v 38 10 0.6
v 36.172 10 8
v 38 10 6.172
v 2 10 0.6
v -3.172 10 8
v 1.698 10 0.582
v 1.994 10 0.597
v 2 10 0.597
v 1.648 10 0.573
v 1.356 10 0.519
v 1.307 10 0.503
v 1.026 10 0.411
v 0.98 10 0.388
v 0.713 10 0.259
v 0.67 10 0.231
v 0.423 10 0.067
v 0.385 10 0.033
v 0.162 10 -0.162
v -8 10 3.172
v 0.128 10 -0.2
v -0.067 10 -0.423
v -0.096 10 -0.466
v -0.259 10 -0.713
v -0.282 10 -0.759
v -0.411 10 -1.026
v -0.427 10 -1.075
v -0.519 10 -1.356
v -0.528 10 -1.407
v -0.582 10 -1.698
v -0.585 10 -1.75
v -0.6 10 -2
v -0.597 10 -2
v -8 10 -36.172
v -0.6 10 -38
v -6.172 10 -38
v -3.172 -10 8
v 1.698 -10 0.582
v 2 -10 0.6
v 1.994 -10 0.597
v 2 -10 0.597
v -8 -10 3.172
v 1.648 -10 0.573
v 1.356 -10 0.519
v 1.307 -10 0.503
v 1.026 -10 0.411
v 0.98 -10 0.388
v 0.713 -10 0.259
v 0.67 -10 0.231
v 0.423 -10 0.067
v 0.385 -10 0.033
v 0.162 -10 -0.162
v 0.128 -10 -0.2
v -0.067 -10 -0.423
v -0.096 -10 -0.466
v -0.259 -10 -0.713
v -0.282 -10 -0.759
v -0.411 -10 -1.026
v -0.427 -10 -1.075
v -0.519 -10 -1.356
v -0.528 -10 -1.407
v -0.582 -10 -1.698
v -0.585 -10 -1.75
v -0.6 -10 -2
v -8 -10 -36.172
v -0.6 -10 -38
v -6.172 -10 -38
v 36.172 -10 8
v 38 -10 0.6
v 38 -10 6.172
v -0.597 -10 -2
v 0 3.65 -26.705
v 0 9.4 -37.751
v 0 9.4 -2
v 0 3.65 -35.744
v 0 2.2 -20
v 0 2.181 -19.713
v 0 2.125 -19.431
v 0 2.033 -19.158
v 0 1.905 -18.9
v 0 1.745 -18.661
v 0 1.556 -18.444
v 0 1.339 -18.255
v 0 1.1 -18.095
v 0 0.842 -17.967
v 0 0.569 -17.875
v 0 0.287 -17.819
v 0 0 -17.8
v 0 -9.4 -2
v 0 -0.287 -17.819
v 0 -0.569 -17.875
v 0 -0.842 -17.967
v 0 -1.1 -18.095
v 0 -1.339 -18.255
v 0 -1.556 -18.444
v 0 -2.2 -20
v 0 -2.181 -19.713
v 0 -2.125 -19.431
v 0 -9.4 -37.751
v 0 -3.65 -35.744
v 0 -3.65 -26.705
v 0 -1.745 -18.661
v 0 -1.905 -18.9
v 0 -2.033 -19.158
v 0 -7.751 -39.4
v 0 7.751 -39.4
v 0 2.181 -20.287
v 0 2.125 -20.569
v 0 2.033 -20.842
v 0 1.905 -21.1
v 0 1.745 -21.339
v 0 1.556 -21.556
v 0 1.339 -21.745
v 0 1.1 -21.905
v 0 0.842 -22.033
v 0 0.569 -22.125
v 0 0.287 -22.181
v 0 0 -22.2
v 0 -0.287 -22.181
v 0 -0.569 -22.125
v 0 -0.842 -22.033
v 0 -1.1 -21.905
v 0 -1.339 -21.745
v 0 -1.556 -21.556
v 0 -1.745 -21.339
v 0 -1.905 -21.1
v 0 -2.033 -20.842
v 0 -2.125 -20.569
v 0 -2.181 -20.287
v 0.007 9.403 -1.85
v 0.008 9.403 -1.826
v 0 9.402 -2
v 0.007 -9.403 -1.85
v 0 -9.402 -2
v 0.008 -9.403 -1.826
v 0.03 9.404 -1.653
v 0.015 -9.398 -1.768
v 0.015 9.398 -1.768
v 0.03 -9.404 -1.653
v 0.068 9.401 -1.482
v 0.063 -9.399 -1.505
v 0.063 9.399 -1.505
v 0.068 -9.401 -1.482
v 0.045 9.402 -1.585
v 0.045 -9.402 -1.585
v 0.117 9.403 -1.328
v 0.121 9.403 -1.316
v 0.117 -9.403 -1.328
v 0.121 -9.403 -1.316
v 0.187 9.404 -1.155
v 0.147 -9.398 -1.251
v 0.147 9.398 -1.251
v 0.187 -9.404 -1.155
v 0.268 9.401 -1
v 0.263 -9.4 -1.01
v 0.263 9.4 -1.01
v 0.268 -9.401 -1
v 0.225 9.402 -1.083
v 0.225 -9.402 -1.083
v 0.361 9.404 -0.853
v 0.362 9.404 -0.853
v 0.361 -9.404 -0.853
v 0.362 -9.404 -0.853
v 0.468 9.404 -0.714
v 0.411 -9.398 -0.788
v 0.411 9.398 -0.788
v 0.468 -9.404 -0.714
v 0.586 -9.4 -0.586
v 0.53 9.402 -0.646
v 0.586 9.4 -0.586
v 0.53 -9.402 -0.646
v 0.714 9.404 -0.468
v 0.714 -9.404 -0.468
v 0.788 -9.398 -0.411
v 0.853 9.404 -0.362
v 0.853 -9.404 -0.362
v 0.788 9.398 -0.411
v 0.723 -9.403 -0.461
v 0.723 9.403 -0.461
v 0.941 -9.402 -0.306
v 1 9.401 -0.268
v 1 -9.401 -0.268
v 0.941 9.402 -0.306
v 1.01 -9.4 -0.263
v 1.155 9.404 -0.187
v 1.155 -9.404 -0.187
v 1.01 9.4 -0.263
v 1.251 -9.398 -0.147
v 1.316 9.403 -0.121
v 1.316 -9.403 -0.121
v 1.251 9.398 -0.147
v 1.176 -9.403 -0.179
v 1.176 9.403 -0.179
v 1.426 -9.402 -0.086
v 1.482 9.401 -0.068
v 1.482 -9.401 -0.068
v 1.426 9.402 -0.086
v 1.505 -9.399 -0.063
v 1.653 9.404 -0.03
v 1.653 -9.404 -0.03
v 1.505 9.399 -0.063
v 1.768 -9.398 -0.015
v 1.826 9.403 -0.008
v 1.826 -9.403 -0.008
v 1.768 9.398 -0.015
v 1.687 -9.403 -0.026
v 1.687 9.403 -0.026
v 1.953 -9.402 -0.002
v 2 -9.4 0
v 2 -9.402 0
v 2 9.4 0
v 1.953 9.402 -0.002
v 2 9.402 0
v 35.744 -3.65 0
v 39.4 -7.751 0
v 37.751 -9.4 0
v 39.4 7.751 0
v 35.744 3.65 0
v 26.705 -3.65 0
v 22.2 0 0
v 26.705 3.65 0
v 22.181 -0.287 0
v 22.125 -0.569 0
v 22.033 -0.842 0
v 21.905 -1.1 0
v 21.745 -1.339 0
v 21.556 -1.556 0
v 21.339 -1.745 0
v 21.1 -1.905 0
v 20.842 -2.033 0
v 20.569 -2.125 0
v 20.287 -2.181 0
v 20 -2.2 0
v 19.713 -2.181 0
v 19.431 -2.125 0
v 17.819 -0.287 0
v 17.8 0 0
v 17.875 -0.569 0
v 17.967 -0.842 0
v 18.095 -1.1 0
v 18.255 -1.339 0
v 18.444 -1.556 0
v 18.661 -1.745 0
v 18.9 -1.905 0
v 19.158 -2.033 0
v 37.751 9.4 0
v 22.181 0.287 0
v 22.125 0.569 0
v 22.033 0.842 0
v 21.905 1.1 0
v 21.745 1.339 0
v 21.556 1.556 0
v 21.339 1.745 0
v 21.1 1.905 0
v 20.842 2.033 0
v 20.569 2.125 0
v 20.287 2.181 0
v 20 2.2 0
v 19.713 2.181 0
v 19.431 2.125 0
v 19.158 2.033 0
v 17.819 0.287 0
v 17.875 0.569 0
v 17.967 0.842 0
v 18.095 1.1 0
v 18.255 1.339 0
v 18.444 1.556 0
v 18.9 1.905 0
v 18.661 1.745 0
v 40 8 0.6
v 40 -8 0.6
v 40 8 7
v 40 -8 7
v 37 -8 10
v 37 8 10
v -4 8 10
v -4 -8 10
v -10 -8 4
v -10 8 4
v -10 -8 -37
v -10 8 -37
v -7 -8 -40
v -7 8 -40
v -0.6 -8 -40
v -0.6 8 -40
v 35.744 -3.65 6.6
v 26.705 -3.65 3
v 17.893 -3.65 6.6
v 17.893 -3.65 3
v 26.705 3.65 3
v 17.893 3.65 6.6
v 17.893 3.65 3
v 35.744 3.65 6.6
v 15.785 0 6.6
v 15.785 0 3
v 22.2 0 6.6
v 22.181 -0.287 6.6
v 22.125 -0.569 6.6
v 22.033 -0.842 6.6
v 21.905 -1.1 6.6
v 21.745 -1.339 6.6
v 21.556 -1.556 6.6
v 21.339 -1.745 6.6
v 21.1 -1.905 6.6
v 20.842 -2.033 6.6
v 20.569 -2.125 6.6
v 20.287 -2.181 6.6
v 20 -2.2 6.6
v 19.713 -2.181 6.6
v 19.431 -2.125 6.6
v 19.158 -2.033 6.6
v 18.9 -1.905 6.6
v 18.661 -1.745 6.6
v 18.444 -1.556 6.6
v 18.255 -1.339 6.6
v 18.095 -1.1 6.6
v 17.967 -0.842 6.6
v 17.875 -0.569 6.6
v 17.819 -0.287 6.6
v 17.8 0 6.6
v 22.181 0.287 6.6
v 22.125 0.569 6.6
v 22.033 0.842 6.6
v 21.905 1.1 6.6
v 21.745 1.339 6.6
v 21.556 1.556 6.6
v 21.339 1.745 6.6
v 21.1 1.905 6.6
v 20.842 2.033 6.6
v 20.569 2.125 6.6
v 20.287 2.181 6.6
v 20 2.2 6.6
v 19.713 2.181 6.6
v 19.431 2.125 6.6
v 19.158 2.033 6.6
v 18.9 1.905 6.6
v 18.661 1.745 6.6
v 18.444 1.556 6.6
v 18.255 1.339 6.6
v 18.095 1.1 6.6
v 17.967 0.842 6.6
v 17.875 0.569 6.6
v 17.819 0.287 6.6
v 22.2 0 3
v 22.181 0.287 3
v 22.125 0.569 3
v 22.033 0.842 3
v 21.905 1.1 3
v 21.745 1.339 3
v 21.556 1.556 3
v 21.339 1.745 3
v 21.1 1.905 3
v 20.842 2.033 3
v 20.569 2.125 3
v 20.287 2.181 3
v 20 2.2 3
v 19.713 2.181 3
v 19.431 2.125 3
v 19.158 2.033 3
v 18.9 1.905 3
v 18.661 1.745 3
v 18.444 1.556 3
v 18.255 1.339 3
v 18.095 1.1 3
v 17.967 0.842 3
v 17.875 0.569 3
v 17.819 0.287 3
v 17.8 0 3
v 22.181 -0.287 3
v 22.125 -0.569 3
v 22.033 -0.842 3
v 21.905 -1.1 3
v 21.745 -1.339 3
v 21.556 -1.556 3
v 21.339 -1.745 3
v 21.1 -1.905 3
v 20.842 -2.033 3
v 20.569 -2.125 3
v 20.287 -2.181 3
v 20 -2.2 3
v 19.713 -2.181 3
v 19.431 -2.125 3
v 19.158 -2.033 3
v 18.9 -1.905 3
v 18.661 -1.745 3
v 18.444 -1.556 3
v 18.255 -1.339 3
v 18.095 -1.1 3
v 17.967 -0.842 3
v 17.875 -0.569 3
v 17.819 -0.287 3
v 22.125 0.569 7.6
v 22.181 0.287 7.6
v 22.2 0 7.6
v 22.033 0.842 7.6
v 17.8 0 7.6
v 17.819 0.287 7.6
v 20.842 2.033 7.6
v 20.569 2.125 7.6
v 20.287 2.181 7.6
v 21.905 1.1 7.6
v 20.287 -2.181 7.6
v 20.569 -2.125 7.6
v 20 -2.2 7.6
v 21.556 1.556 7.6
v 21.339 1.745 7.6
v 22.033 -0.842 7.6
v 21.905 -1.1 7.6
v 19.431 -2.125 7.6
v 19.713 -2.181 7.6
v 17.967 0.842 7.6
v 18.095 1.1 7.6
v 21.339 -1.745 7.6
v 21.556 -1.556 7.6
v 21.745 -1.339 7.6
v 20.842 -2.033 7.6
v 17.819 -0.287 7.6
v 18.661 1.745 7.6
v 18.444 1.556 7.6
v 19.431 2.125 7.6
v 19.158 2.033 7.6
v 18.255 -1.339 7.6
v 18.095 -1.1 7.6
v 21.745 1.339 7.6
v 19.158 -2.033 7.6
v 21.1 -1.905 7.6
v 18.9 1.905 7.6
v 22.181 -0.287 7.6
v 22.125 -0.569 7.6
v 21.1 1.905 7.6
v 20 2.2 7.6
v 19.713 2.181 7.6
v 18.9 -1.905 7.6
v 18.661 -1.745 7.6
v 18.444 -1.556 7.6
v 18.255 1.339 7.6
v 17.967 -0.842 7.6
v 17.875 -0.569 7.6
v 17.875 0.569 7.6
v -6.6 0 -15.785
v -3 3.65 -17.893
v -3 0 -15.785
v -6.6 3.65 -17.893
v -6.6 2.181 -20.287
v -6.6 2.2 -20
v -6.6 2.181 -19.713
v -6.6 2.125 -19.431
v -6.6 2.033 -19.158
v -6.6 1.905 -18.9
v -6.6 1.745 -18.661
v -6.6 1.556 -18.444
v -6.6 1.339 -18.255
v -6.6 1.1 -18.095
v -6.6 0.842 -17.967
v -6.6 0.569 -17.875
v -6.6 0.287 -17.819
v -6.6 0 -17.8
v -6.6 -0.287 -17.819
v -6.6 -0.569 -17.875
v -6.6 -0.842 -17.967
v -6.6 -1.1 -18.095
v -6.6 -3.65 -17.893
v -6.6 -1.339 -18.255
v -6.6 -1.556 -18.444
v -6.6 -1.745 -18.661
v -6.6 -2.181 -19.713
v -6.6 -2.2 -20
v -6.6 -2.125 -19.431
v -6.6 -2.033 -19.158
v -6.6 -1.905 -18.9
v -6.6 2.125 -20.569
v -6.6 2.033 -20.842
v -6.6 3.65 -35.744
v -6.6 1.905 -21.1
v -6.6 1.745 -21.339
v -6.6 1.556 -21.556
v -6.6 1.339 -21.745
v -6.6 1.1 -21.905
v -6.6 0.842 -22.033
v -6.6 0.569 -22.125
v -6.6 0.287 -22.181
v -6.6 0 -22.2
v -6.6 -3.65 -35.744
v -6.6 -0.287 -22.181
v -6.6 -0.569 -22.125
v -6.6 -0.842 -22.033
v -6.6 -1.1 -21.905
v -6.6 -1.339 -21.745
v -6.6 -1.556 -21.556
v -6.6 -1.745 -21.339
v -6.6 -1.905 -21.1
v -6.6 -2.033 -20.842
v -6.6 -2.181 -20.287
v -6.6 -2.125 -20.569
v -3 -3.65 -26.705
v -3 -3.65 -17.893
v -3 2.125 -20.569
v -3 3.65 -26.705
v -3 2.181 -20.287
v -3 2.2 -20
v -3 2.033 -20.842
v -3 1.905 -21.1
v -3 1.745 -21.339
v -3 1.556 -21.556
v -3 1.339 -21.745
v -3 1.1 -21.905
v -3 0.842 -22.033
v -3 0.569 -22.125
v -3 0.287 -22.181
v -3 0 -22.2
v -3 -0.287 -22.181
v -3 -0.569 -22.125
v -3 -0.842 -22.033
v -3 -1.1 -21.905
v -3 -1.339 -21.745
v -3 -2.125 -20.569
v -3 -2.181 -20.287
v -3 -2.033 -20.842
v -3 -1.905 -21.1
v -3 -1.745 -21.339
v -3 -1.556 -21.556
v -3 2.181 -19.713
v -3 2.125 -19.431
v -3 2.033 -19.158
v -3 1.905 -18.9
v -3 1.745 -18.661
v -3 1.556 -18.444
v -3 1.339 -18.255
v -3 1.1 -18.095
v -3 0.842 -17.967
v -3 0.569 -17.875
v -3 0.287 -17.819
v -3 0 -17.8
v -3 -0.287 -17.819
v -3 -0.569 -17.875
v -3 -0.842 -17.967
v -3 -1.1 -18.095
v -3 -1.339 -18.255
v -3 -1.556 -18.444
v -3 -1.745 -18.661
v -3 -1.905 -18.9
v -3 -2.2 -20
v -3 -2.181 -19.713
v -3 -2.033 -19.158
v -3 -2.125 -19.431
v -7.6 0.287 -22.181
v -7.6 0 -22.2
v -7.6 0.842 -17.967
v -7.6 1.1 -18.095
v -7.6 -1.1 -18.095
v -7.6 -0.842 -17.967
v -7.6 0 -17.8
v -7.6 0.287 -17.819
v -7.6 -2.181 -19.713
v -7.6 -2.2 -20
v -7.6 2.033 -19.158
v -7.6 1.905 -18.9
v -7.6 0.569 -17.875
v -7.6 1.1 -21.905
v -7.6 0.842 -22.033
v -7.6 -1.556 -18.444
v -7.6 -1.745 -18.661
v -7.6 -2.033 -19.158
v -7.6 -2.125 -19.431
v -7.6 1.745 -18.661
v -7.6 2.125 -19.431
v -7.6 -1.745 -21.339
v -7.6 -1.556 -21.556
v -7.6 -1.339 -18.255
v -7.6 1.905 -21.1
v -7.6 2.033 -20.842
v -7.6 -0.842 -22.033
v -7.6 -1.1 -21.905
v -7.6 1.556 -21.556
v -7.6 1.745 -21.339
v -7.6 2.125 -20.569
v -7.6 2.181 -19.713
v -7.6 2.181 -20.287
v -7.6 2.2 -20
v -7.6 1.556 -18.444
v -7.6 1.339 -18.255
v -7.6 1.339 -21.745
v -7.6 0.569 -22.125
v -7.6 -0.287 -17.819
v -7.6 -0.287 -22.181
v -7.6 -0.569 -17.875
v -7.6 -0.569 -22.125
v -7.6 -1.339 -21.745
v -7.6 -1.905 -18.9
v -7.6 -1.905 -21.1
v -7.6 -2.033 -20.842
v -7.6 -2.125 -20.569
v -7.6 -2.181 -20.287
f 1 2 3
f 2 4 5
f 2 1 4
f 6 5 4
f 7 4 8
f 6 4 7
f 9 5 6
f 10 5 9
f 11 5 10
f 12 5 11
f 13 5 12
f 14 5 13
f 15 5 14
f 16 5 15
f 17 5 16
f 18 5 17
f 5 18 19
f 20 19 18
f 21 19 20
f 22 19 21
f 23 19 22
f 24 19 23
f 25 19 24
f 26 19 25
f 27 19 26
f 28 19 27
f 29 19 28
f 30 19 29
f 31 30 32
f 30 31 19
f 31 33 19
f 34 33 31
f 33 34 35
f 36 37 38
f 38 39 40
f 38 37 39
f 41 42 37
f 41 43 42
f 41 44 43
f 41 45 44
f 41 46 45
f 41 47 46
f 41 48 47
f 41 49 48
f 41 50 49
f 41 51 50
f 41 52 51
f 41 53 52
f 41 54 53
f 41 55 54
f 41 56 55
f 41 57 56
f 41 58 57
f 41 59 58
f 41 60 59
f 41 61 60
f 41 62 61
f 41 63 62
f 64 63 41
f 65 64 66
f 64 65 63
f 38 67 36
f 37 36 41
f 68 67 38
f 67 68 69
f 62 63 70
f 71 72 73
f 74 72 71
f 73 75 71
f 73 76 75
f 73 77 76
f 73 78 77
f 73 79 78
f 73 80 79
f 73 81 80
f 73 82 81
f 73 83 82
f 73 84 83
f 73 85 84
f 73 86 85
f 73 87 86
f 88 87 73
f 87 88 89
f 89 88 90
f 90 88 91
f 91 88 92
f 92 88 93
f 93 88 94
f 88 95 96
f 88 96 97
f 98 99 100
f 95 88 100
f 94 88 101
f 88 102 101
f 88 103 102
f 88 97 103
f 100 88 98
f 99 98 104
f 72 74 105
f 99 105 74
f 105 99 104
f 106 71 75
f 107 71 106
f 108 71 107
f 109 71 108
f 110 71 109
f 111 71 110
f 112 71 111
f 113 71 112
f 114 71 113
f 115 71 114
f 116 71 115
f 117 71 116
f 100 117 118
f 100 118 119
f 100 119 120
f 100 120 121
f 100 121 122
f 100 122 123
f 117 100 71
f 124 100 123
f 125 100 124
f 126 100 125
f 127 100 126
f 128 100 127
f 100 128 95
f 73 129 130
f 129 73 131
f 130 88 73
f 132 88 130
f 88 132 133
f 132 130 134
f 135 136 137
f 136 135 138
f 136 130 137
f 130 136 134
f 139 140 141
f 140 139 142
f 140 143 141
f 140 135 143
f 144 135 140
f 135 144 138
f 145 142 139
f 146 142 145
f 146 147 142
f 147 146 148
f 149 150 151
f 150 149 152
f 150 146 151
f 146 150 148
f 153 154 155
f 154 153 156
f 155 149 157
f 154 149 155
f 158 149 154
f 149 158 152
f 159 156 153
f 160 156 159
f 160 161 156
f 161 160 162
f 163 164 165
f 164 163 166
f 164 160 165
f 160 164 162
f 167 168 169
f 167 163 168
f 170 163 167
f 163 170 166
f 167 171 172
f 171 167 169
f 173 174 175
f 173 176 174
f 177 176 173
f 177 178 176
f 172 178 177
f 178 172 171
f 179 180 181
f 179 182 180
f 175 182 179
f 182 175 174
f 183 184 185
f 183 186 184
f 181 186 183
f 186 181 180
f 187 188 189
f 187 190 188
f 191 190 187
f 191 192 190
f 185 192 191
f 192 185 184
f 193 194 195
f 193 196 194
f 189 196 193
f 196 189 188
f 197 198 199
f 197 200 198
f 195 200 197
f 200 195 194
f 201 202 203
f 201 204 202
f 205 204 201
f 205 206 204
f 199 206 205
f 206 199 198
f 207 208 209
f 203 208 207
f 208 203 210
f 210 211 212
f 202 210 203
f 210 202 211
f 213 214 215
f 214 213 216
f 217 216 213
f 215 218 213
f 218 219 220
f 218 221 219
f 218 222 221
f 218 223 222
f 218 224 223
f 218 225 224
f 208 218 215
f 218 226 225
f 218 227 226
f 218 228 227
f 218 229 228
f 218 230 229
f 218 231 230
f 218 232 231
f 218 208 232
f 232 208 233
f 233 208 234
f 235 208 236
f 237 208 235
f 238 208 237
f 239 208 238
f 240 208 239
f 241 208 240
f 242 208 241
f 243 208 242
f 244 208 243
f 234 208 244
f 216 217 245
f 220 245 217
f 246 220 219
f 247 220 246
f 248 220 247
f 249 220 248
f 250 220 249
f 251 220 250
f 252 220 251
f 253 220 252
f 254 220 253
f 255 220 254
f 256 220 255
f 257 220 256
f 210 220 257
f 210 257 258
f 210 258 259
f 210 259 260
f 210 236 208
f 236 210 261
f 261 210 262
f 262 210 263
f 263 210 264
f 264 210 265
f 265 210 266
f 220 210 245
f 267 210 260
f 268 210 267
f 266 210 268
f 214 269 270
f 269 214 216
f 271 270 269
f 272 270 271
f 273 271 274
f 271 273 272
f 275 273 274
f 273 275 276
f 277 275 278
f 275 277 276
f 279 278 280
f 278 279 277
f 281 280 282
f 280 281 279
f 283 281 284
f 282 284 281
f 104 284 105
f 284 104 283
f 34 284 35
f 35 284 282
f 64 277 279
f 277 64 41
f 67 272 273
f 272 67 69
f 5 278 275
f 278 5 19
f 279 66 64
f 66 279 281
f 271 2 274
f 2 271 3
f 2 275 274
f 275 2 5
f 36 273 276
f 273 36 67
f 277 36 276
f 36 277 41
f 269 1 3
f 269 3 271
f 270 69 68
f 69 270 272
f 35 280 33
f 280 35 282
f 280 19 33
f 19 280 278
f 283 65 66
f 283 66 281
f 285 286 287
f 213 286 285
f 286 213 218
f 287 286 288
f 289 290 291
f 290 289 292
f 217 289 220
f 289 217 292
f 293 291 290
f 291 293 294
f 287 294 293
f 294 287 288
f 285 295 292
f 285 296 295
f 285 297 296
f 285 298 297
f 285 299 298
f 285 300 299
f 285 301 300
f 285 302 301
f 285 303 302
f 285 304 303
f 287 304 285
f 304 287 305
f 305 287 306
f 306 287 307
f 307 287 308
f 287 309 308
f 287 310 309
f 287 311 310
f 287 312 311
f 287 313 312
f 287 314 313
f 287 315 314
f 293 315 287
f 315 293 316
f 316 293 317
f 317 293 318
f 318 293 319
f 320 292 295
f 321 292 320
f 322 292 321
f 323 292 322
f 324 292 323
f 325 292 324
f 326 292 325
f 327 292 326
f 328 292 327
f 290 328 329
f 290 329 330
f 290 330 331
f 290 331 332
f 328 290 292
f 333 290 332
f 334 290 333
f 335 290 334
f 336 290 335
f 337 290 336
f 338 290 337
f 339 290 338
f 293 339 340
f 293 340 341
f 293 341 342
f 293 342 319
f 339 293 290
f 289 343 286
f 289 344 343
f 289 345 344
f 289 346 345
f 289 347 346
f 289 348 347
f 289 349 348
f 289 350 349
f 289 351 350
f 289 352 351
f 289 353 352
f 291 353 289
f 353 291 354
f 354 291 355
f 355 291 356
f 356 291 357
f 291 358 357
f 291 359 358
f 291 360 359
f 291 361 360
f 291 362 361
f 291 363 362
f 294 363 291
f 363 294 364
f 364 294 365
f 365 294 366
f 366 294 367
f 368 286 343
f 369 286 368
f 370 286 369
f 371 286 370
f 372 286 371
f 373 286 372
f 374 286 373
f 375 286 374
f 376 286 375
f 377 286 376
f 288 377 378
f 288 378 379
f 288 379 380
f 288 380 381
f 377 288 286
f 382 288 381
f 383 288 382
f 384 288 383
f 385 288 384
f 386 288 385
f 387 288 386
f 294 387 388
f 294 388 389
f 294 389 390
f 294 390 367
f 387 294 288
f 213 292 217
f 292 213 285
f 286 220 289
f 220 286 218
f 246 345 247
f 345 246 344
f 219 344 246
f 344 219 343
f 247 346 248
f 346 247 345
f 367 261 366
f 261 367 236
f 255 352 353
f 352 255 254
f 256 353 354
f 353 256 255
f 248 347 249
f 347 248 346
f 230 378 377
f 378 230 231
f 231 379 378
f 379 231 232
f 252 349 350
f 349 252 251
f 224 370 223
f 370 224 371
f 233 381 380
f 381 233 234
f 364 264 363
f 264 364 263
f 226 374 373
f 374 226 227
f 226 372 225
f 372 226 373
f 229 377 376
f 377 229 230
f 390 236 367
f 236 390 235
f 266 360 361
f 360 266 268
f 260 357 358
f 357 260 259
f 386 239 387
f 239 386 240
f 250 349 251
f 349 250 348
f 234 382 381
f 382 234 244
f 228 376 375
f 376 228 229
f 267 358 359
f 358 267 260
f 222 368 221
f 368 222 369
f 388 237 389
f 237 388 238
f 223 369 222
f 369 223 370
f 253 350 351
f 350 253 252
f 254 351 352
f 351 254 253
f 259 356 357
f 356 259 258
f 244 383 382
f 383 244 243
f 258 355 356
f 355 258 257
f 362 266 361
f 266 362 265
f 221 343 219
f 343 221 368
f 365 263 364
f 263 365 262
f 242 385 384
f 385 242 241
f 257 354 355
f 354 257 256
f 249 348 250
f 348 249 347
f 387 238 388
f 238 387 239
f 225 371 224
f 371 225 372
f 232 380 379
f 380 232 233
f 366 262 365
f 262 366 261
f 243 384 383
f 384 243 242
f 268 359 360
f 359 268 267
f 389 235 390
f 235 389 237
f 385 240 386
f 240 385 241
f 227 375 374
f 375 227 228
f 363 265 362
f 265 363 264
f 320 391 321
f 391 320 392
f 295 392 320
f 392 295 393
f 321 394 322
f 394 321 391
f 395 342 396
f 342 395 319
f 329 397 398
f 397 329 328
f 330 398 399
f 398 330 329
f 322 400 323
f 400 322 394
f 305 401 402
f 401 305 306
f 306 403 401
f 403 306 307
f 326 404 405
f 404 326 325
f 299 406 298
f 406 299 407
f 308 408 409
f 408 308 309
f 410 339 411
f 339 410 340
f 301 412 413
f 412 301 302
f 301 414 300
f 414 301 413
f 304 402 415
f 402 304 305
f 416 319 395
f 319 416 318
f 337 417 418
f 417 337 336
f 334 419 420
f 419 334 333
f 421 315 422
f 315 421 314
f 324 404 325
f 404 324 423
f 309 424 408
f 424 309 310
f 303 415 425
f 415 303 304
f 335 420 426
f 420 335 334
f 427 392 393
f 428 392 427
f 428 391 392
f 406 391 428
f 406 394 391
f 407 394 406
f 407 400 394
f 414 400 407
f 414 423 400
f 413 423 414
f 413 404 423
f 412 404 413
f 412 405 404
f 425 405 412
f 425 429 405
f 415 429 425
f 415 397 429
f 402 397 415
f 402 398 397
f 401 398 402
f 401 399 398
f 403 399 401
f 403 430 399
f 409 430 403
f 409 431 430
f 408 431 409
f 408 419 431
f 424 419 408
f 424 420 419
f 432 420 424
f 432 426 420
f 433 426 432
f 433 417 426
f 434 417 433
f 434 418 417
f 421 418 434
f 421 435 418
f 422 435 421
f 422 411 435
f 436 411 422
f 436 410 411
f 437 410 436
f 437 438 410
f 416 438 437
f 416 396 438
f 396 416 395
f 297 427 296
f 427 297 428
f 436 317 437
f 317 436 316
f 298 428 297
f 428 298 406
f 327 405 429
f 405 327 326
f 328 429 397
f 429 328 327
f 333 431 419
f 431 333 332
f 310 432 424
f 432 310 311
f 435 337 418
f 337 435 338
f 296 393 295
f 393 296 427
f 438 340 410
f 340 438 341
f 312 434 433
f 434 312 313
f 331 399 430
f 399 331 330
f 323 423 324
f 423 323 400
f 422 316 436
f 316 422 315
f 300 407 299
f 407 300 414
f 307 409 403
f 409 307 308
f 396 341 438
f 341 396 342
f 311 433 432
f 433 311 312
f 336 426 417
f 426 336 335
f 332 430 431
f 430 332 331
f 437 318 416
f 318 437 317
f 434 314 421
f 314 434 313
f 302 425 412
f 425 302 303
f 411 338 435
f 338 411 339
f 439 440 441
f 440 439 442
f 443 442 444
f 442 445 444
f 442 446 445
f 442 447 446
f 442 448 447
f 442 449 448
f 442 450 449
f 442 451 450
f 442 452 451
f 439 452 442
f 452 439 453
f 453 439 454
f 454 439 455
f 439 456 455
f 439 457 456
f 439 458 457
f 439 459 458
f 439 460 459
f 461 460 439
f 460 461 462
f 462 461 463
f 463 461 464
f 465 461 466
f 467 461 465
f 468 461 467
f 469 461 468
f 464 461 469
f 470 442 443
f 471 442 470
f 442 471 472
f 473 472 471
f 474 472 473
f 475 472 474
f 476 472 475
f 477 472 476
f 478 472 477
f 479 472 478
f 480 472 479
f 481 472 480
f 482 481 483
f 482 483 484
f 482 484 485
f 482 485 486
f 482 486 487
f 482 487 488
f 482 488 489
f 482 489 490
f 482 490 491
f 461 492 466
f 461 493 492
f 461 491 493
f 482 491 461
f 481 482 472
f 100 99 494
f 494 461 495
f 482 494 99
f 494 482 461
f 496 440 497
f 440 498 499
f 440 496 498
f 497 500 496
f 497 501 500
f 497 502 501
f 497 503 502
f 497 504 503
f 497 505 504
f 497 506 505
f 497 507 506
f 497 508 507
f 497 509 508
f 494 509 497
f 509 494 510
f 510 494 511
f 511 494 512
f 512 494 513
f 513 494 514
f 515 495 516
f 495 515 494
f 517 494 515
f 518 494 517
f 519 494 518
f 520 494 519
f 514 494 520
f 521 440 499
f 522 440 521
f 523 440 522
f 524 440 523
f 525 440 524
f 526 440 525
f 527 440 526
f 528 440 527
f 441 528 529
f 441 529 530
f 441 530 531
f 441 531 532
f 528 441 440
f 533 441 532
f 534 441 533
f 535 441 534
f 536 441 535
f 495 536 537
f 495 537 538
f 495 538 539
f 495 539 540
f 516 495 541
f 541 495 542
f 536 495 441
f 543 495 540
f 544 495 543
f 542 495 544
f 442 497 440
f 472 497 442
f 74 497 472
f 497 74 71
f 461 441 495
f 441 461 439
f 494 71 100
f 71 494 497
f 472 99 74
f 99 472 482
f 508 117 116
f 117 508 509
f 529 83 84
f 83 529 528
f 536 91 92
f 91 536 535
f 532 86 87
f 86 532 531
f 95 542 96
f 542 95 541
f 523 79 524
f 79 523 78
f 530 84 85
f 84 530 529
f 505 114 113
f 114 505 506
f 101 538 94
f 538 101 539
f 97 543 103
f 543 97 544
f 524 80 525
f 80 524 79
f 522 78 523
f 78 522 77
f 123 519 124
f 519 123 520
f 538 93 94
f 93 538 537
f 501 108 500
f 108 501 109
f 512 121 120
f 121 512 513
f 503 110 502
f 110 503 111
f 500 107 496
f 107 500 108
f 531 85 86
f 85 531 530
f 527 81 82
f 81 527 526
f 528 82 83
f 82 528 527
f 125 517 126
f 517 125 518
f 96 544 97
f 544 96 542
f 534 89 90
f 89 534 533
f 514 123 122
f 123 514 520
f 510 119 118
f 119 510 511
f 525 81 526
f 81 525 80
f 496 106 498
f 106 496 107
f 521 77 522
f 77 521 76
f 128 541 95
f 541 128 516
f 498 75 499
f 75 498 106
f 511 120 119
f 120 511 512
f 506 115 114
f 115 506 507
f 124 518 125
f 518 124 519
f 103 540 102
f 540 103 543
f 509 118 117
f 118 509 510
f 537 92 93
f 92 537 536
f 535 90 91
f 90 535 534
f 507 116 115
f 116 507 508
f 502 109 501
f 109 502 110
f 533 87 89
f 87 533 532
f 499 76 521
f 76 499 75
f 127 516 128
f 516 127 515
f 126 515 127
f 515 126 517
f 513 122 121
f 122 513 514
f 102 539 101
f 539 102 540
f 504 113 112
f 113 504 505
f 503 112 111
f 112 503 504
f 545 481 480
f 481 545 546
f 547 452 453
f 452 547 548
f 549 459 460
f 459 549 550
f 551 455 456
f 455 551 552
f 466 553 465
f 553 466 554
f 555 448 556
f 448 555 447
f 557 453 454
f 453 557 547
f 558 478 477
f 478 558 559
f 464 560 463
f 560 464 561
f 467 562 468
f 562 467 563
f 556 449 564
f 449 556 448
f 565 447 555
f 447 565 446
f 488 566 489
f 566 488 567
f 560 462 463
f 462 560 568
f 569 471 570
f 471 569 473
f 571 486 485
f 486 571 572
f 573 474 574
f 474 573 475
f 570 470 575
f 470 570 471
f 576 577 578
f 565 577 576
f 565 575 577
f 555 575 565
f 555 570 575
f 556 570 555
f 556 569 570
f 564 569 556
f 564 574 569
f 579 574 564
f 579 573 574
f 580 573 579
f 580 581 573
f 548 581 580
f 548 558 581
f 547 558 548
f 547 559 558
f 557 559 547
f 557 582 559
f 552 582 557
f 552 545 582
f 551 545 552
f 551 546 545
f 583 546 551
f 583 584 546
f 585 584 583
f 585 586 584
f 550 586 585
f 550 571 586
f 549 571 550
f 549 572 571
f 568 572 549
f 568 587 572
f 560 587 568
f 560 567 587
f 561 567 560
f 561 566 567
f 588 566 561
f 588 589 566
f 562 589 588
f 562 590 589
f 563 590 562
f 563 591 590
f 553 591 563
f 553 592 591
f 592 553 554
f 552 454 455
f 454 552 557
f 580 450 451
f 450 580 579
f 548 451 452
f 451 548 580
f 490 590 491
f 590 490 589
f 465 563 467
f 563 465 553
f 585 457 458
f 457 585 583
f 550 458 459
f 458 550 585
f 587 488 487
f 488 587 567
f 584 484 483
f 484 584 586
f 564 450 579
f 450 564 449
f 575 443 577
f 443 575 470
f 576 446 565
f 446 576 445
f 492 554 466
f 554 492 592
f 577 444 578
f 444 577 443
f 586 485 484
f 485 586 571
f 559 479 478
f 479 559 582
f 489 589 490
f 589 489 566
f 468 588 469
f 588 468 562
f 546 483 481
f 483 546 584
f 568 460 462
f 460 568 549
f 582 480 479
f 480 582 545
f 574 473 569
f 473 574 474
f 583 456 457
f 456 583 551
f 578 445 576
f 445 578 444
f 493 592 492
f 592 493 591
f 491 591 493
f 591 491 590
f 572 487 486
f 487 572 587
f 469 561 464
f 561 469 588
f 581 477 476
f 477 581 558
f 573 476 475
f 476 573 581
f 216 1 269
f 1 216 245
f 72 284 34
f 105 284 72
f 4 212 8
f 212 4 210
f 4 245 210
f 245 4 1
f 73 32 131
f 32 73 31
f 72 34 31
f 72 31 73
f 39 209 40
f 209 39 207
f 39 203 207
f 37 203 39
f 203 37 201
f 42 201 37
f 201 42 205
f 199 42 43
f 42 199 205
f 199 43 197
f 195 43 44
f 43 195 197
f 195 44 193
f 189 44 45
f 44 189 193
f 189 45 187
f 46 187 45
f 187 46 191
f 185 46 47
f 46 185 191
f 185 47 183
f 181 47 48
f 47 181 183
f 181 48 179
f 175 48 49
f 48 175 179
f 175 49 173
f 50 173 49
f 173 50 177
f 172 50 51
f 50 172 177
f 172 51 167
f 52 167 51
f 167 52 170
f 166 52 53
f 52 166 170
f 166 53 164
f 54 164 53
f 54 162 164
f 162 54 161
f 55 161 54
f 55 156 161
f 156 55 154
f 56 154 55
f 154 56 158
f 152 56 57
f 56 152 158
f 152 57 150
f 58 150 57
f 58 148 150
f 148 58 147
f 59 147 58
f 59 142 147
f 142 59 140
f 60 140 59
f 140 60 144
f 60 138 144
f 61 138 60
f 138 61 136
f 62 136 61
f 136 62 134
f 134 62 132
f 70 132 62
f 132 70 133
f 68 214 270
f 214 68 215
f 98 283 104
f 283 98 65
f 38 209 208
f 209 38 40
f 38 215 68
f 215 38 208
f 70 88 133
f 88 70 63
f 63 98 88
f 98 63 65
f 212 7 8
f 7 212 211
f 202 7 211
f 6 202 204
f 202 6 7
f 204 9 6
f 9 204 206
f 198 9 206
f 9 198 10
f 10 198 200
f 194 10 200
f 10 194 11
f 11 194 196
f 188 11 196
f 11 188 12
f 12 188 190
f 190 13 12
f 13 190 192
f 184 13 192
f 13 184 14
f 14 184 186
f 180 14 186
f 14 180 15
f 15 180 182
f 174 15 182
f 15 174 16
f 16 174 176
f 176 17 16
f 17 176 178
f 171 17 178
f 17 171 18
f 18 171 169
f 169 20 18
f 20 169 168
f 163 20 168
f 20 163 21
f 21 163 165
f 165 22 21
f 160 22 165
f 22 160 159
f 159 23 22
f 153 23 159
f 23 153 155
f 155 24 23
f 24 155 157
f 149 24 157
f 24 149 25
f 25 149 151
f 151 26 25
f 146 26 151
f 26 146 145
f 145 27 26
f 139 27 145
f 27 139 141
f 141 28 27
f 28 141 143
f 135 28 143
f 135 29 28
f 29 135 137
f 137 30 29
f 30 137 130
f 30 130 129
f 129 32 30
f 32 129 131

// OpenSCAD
// file: inspection.scad
// Optional section clipping for OpenSCAD Customizer inspection.
// The bracket's default "None" mode passes the geometry through unchanged.
// For X/Y/Z, intersect geometry with a slab of the requested depth in mm.
module util_section_inspect(axis = "None", position_mm = 0, depth_mm = 10, direction = "Positive") {
    if (axis == "None")
        children();
    else {
        extent = 10000;
        low = (direction == "Negative") ? position_mm - depth_mm : position_mm;
        intersection() {
            children();
            if (axis == "X")
                translate([low, -extent / 2, -extent / 2])
                    cube([depth_mm, extent, extent]);
            else if (axis == "Y")
                translate([-extent / 2, low, -extent / 2])
                    cube([extent, depth_mm, extent]);
            else if (axis == "Z")
                translate([-extent / 2, -extent / 2, low])
                    cube([extent, extent, depth_mm]);
        }
    }
}
// main file
// Outside-corner L bracket for plywood joints.
// All dimensions are in millimetres. Adjust settings in the OpenSCAD Customizer.
//
// Side view (X to the right, Z upwards), with wood inside the bracket:
//
//     ____________________        <- bracket, top arm (outside the horizontal panel)
//    /  ##################
//   |  ||==================      <- horizontal plywood panel (10 mm)
//   |  ||
//   |  ||  vertical plywood panel
//   |  ||
//    bracket, vertical arm (outside the upright panel)
//
// Bolts enter from inside the plywood and thread into captive nuts in the bracket.
// Insert a nut through the access window on the wood-facing side of the bracket,
// slide it under the 3 mm retaining wall and push it against the stop.
// Hook the plug tab under the retaining lip, then press the opposite end down.
// The plywood covers the window; the outside face of the bracket stays solid.
//
// PRINTING: put the bracket on one flat side and the plugs on their sides.
// This lets layer lines follow the part outlines for improved strength.
//
// Requires inspection.scad in this directory for the optional section view.

use <inspection.scad>

/* [Display] */
part       = "bracket"; // [bracket, plug]
show_wood  = true;     // translucent plywood preview; excluded from STL
show_plugs = false;    // display fitted plugs; excluded from STL
part_color = [0.29, 0.56, 0.72]; // color
plug_color = [0.93, 0.58, 0.22]; // color

/* [Section inspection] */
c_section_axis        = "None";     // [None, X, Y, Z]
c_section_position_mm = 0;          // [-60:0.5:60]
c_section_depth_mm    = 10;         // [0.1:0.1:80]
c_section_direction   = "Positive"; // [Positive, Negative]

/* [Plywood] */
ply_t    = 10;     // plywood thickness
wood_w   = 60;     // panel width, display only
wood_len = 80;     // panel length, display only

/* [Bracket geometry] */
W        = 20;     // bracket width
t        = 10;     // bracket wall thickness
armH     = 40;     // length of top arm from the outer plywood end
armV     = 40;     // length of vertical arm from the top of horizontal plywood
ce       = 6;      // 45-degree outer corner chamfer (6 gives 9.9 mm diagonal wall)
c        = 3;      // 45-degree chamfer at outer arm ends
cs       = 2;      // 45-degree side-edge chamfers; 0 disables

/* [Print compensation] */
ef       = 0.6;    // 45-degree elephant-foot relief around wood-facing edges; 0 disables
r_in     = 2.0;    // inside corner radius: plywood must be rounded at least this much; 0 or >=1

/* [Bolt and captive nut] */
bolt_edge = 10;    // bolt position beyond the inner face of the other panel
nut_type  = "hex"; // [hex, square]
bolt_d    = 4;
bolt_clr  = 0.4;   // bolt-hole clearance
nut_flats = 7;     // M4 nut across flats; measure your actual nuts
nut_h     = 3.2;   // nominal M4 nut thickness
nut_clr   = 0.3;   // captive-nut pocket clearance
wood_wall = 3;     // load-bearing wall between plywood and nut
tip_hole  = 1;     // blind hole for extra bolt length beyond the nut
                   // (M4x16 nominal fit; outer skin = t - wood_wall - pocket_h - tip_hole)

/* [Window plug] */
plug_clr    = 0.15; // clearance around access plug
lip_len     = 2.5;  // free slot from captive nut to window for plug's hooked tab
lip_thk     = 2.4;  // tab thickness
win_extra   = 0.6;  // extra window length to allow angled plug insertion
plug_ch     = 1.0;  // 45-degree bevel on far end of plug for insertion
plug_handle = "hole"; // [hole, slot, none] hole = pin/screw opening, slot = screwdriver notch

/* [Hidden] */
$fn = 48;

// ---------- Derived dimensions ----------
Wn       = nut_flats + nut_clr;   // nut pocket width (across flats)
Ln       = (nut_type == "hex") ? Wn / cos(30) : Wn;   // pocket length (hex vertex-to-vertex)
pocket_h = nut_h + 0.4;           // nut-pocket depth
skin     = t - wood_wall - pocket_h - tip_hole;   // closed outside wall
D        = wood_wall + pocket_h;  // window depth from wood-facing surface
Lw       = Ln + win_extra;        // window length
lip_l    = lip_len - 0.2;         // plug tab length

hx = ply_t + bolt_edge;           // top-arm bolt X position
vz = -(ply_t + bolt_edge);        // vertical-arm bolt Z position
tip_x = hx + Ln / 2 + lip_len;    // top-arm window start
tip_z = vz - Ln / 2 - lip_len;    // vertical-arm window start

echo("Outer skin behind nut (mm):", skin);
echo("Window end (mm):", tip_x + Lw, " arm length:", armH);

// ---------- Plywood preview (joint corner at origin) ----------
module wood() {
    color("burlywood", 0.45) difference() {
        union() {
            translate([0, -wood_w / 2, -ply_t]) cube([wood_len, wood_w, ply_t]);
            translate([0, -wood_w / 2, -wood_len]) cube([ply_t, wood_w, wood_len - ply_t]);
        }
        translate([hx, 0, -ply_t - 1]) cylinder(d = bolt_d + bolt_clr, h = ply_t + 2);
        translate([-1, 0, vz]) rotate([0, 90, 0]) cylinder(d = bolt_d + bolt_clr, h = ply_t + 2);
        // Remove material at the inside corner to match the bracket radius.
        if (r_in > 0) difference() {
            translate([-1, -wood_w / 2 - 1, -r_in]) cube([r_in + 1, wood_w + 2, r_in + 1]);
            translate([r_in, 0, -r_in]) rotate([90, 0, 0]) cylinder(r = r_in, h = wood_w + 4, center = true);
        }
    }
}

// ---------- Bracket side profile ----------
// The rounded inside corner (r_in) adds material around the plywood corner,
// reducing stress concentration. Round the corresponding plywood corner.
corner_arc = (r_in > 0)
    ? [for (a = [180 : -5 : 90]) [r_in + r_in * cos(a), -r_in + r_in * sin(a)]]
    : [[0, 0]];

// End edges also receive elephant-foot relief so the wood-facing bevel
// continues around side edges, ends, and the inside corner.
tip_top  = (ef > 0) ? [[armH - ef, 0], [armH, ef]] : [[armH, 0]];
tip_vert = (ef > 0) ? [[-ef, -armV], [0, -armV + ef]] : [[0, -armV]];

module profile() {
    polygon(concat(tip_top, [
        [armH, t - c],            // 45-degree top-arm end
        [armH - c, t],
        [-t + ce, t],
        [-t, t - ce],             // 45-degree outside corner
        [-t, -armV + c],
        [-t + c, -armV]           // 45-degree vertical-arm end
    ], tip_vert, corner_arc));    // rounded inside corner from (0,-r) to (r,0)
}

// Convex envelope of the bracket with its inside corner filled in. Side
// chamfers affect the outer edges only; the wood-facing area stays flat.
module outer_shape() {
    polygon([
        [armH, -armV], [armH, t - c], [armH - c, t], [-t + ce, t],
        [-t, t - ce], [-t, -armV + c], [-t + c, -armV]
    ]);
}

module side_chamfer_env() {
    rotate([90, 0, 0]) hull() {
        linear_extrude(height = W - 2 * cs, center = true) outer_shape();
        linear_extrude(height = W, center = true) offset(delta = -cs) outer_shape();
    }
}

module body() {
    intersection() {
        rotate([90, 0, 0]) linear_extrude(height = W, center = true) profile();
        if (cs > 0) side_chamfer_env();
        else rotate([90, 0, 0]) linear_extrude(height = W, center = true) outer_shape();
    }
}

// ---------- Elephant-foot relief on wood-facing edges ----------
module ef_wedge_profile() {   // triangle in local (u=y, v=material depth) coordinates
    polygon([[W / 2 - ef - 1, -1], [W / 2 + 1, -1], [W / 2 + 1, ef + 1]]);
}

// Generic 45-degree relief along a straight wood-facing edge:
// A = starting point, U = outward in plane, V = into material,
// D = edge direction, len = edge length (U x V = D).
module ef_edge_wedge(A, U, V, D, len) {
    multmatrix([[U[0], V[0], D[0], A[0]],
                [U[1], V[1], D[1], A[1]],
                [U[2], V[2], D[2], A[2]],
                [0, 0, 0, 1]])
        linear_extrude(height = len)
            polygon([[-ef - 1, -1], [1, -1], [1, ef + 1]]);
}

module ef_cuts() {
    s2 = sqrt(2) / 2;
    if (ef > 0) for (m = [0, 1]) mirror([0, m, 0]) {
        // Diagonal corners where side and end chamfers meet.
        if (cs > 0) {
            // Top arm: (armH-cs, W/2) to (armH, W/2-cs) at z=0.
            ef_edge_wedge([armH - cs - s2, W / 2 + s2, 0], [s2, s2, 0], [0, 0, 1], [s2, -s2, 0],
                          cs * sqrt(2) + 2);
            // Vertical arm: (W/2-cs, -armV) to (W/2, -armV+cs) at x=0.
            ef_edge_wedge([0, W / 2 - cs - s2, -armV - s2], [0, s2, -s2], [-1, 0, 0], [0, s2, s2],
                          cs * sqrt(2) + 2);
        }
        // Edge along the top arm (z=0, x=r_in..armH).
        translate([r_in, 0, 0]) rotate([90, 0, 90])
            linear_extrude(height = armH + 1 - r_in) ef_wedge_profile();
        // Edge along the vertical arm (x=0, z=-r_in..-armV).
        translate([0, 0, -armV - 1]) rotate([0, 0, 90])
            linear_extrude(height = armV + 1 - r_in) ef_wedge_profile();
        // Edge along the rounded inside corner.
        if (r_in >= 1)
            translate([r_in, 0, -r_in]) rotate([90, 0, 0]) rotate([0, 0, 89])
                rotate_extrude(angle = 92)
                    polygon([[r_in - 1, W / 2 - ef - 1], [r_in - 1, W / 2 + 1], [r_in + ef + 1, W / 2 + 1]]);
    }
}

// ---------- Captive-nut pocket with window on wood-facing side ----------
// The nut pocket lies behind wood_wall. A free slot connects the pocket
// to the access window. Slide the nut through the window towards the corner,
// then hook the plug tab into the slot.

// Top arm: bolt along Z.
module nut_top() {
    z0 = wood_wall;
    if (nut_type == "hex") {
        translate([hx, 0, z0]) cylinder(d = Ln, h = pocket_h, $fn = 6);
        translate([hx, -Wn / 2, z0]) cube([Ln / 2 + lip_len + 0.02, Wn, pocket_h]);
    } else
        translate([hx - Ln / 2, -Wn / 2, z0]) cube([Ln + lip_len + 0.02, Wn, pocket_h]);
    // Window opening from the wood-facing surface.
    translate([tip_x - 0.01, -Wn / 2, -0.01]) cube([Lw + 0.01, Wn, D + 0.01]);
    // Bolt hole through retaining wall plus blind clearance behind nut.
    translate([hx, 0, -1]) cylinder(d = bolt_d + bolt_clr, h = wood_wall + 2);
    translate([hx, 0, z0 + pocket_h - 0.01]) cylinder(d = bolt_d + bolt_clr, h = tip_hole + 0.01);
}

// Vertical arm: bolt along X.
module nut_side() {
    x0 = -D;
    if (nut_type == "hex") {
        translate([x0, 0, vz]) rotate([0, 90, 0]) cylinder(d = Ln, h = pocket_h, $fn = 6);
        translate([x0, -Wn / 2, tip_z - 0.02]) cube([pocket_h, Wn, Ln / 2 + lip_len + 0.02]);
    } else
        translate([x0, -Wn / 2, tip_z - 0.02]) cube([pocket_h, Wn, Ln + lip_len + 0.02]);
    // Window opening from the wood-facing surface.
    translate([x0, -Wn / 2, tip_z - Lw]) cube([D + 0.01, Wn, Lw + 0.01]);
    // Bolt hole through retaining wall plus blind clearance behind nut.
    translate([1, 0, vz]) rotate([0, -90, 0]) cylinder(d = bolt_d + bolt_clr, h = wood_wall + 2);
    translate([x0 + 0.01, 0, vz]) rotate([0, -90, 0]) cylinder(d = bolt_d + bolt_clr, h = tip_hole + 0.01);
}

module beugel() {
    difference() {
        body();
        nut_top();
        nut_side();
        ef_cuts();
    }
}

// ---------- Access-window plug ----------
// Window-local coordinates: u runs along the arm towards its end (0=start),
// v is transverse (Y), and w is depth from the wood-facing surface.
// The tab at u<0 engages the slot under the retaining wall.
// Insert the tab at an angle, then press the far end flush with the wood face.
module plug_local() {
    pc = plug_clr;
    pw = Wn - 2 * pc;
    difference() {
        rotate([90, 0, 0]) linear_extrude(height = pw, center = true)
            polygon([
                [pc, 0], [Lw - pc, 0],
                [Lw - pc, D - pc - plug_ch], [Lw - pc - plug_ch, D - pc],   // insertion bevel
                [-lip_l, D - pc],                                           // bottom face and tab
                [-lip_l, D - pc - lip_thk], [pc, D - pc - lip_thk]
            ]);
        // Extraction hole (pin/small screw) or screwdriver slot.
        if (plug_handle == "hole") translate([Lw / 2, 0, -1]) cylinder(d = 2.5, h = 5, $fn = 24);
        if (plug_handle == "slot") translate([Lw - pc - 3, -pw / 2 - 1, -1]) cube([1.2, pw + 2, 3]);
    }
}

// Lay plugs on their sides for printing; layer lines run through each tab.
module plug_print() {
    translate([lip_l, D, (Wn - 2 * plug_clr) / 2]) rotate([90, 0, 0]) plug_local();
}

// Show installed plugs in the access windows for visual inspection only.
module plugs_in_place() {
    translate([tip_x, 0, 0]) plug_local();
    multmatrix([[0, 0, -1, 0], [0, -1, 0, 0], [-1, 0, 0, tip_z], [0, 0, 0, 1]]) plug_local();
}

// ===== DISPLAY / PRINT-PART SELECTOR =====
if (part == "plug") {
    util_section_inspect(c_section_axis, c_section_position_mm, c_section_depth_mm, c_section_direction)
        color(plug_color)
            for (i = [0, 1]) translate([i * (Lw + lip_l + 4), 0, 0]) plug_print();
} else {
    util_section_inspect(c_section_axis, c_section_position_mm, c_section_depth_mm, c_section_direction)
        color(part_color) beugel();
    if (show_wood)
        %util_section_inspect(c_section_axis, c_section_position_mm, c_section_depth_mm, c_section_direction)
            wood();
    if (show_plugs)
        %util_section_inspect(c_section_axis, c_section_position_mm, c_section_depth_mm, c_section_direction)
            color(plug_color) plugs_in_place();
}
